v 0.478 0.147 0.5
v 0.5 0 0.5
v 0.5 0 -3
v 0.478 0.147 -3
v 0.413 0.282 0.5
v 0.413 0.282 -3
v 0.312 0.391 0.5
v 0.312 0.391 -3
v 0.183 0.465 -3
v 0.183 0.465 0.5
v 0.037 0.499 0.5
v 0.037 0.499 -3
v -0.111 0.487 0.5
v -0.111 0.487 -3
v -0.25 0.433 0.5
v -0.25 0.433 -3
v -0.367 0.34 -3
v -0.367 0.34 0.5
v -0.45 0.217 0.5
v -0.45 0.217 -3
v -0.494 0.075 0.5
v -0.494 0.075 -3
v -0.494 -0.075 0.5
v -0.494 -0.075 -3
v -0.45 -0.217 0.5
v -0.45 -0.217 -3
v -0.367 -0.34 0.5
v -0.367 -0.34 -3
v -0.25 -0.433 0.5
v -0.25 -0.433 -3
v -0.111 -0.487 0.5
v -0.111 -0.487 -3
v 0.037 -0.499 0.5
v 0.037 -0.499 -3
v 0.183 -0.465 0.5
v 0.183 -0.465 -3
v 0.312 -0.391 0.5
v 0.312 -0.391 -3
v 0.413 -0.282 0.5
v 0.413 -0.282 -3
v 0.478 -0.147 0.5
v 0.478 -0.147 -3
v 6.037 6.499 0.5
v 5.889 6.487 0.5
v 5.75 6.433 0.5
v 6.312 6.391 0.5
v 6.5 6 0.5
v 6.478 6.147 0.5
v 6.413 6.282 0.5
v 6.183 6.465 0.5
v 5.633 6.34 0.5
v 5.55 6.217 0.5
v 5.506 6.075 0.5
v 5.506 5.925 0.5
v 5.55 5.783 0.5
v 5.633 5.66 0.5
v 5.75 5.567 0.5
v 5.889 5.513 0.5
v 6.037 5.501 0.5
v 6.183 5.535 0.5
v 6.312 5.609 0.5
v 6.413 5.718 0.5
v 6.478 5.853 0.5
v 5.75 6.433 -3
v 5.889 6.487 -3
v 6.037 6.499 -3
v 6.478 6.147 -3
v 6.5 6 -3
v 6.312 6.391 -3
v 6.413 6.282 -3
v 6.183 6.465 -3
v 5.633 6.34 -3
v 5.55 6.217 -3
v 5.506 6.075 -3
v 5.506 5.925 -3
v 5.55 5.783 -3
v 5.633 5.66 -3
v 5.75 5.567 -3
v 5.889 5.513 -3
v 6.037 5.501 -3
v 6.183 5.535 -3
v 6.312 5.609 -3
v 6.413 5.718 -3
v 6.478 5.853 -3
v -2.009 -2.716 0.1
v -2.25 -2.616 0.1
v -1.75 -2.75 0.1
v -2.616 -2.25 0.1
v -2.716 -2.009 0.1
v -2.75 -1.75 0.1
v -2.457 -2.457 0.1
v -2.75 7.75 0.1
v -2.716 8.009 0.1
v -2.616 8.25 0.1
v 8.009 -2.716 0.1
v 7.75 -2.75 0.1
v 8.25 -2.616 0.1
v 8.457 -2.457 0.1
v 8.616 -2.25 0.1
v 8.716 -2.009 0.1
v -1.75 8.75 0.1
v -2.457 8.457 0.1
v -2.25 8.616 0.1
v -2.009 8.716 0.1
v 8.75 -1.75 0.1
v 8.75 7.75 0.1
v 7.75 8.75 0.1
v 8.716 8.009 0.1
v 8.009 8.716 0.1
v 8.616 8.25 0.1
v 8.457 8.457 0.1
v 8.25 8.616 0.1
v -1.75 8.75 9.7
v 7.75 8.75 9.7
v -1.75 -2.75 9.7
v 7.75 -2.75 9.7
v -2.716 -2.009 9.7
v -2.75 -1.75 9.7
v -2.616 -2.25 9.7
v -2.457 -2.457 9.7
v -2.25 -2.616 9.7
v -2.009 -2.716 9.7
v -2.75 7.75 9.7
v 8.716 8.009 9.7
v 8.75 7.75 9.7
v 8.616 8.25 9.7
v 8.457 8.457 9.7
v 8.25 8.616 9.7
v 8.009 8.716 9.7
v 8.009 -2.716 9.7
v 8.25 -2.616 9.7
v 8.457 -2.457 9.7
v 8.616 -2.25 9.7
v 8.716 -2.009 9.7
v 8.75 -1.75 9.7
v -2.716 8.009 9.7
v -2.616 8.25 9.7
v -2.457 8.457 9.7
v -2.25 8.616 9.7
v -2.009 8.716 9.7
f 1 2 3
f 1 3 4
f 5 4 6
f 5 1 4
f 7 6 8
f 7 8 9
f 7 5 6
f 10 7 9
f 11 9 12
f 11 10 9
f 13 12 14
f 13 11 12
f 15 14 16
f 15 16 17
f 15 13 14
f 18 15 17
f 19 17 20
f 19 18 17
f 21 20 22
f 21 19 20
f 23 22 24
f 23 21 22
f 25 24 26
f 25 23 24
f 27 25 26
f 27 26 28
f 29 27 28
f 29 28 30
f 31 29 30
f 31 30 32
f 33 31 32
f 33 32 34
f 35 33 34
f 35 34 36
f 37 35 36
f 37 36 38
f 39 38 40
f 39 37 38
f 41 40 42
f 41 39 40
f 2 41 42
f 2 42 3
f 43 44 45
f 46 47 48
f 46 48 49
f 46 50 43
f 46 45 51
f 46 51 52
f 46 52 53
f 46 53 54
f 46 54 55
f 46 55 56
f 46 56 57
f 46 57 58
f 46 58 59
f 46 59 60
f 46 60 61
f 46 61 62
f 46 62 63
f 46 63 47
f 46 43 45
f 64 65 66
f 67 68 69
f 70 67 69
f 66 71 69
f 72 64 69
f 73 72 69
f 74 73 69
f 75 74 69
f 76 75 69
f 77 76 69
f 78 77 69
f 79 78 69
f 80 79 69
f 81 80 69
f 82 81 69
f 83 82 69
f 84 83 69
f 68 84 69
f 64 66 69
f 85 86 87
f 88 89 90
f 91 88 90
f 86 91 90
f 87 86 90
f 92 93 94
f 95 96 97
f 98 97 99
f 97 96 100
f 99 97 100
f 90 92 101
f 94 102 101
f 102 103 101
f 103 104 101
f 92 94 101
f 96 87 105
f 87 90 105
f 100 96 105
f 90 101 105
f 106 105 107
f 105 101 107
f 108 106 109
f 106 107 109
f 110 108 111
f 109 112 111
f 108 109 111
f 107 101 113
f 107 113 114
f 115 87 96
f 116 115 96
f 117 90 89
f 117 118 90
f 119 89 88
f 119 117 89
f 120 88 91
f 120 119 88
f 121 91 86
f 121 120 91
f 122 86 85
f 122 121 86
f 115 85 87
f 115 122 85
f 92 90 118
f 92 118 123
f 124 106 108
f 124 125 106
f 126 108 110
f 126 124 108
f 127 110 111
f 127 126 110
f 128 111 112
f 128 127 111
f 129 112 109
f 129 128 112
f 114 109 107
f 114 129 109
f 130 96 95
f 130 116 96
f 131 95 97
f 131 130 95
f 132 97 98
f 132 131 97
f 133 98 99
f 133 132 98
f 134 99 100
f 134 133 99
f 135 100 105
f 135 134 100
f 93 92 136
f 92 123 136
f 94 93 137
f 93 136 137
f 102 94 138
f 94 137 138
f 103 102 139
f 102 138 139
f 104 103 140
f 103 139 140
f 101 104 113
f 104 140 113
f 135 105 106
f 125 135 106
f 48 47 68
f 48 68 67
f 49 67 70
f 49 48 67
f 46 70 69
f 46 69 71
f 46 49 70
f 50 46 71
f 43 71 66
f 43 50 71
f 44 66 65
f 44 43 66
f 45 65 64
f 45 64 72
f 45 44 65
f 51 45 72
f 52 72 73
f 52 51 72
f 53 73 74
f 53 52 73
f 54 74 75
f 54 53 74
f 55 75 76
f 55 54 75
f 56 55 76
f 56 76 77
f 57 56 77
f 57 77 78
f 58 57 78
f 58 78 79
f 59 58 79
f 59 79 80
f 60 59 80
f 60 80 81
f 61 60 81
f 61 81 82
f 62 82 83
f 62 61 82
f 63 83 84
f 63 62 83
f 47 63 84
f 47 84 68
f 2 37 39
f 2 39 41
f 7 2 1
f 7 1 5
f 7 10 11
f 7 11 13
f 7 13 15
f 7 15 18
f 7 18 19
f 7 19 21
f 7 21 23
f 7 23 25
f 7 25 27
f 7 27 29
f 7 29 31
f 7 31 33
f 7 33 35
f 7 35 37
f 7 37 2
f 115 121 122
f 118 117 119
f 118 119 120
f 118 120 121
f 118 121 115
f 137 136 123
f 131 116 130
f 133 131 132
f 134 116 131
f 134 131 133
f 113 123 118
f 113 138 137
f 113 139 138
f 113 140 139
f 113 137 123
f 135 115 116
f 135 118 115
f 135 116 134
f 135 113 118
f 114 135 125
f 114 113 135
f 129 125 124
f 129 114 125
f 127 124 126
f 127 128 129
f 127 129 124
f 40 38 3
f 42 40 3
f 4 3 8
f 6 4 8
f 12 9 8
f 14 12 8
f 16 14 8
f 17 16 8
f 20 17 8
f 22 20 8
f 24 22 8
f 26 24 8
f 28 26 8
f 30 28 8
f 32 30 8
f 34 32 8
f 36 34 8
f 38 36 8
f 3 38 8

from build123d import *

# Parameters (mm, degrees)
SKETCH001_R  = 0.5
PAD001_DEPTH = 3.5
SKETCH_W     = 11.5
SKETCH_H     = 11.5
PAD_DEPTH    = 9.6
FILLET_R     = 1


with BuildPart() as pad001:
    # Sketch001 → Pad001 (new body)
    with BuildSketch(Plane.XY.offset(0.5)):
        Circle(SKETCH001_R)
        with Locations((6, 6)):
            Circle(SKETCH001_R)
    extrude(amount=-PAD001_DEPTH)


with BuildPart() as fillet_body:
    # Sketch → Pad (new body)
    with BuildSketch(Plane.XY.offset(0.1)):
        with Locations((3, 3)):
            Rectangle(SKETCH_W, SKETCH_H)
    extrude(amount=PAD_DEPTH)

    # Fillet
    fillet_edges = [fillet_body.edges().sort_by_distance(p)[0] for p in [
        (8.75, -2.75, 4.9),
        (8.75, 8.75, 4.9),
        (-2.75, -2.75, 4.9),
        (-2.75, 8.75, 4.9),
    ]]
    fillet(fillet_edges, radius=FILLET_R)


solid = Compound([pad001.part, fillet_body.part])
